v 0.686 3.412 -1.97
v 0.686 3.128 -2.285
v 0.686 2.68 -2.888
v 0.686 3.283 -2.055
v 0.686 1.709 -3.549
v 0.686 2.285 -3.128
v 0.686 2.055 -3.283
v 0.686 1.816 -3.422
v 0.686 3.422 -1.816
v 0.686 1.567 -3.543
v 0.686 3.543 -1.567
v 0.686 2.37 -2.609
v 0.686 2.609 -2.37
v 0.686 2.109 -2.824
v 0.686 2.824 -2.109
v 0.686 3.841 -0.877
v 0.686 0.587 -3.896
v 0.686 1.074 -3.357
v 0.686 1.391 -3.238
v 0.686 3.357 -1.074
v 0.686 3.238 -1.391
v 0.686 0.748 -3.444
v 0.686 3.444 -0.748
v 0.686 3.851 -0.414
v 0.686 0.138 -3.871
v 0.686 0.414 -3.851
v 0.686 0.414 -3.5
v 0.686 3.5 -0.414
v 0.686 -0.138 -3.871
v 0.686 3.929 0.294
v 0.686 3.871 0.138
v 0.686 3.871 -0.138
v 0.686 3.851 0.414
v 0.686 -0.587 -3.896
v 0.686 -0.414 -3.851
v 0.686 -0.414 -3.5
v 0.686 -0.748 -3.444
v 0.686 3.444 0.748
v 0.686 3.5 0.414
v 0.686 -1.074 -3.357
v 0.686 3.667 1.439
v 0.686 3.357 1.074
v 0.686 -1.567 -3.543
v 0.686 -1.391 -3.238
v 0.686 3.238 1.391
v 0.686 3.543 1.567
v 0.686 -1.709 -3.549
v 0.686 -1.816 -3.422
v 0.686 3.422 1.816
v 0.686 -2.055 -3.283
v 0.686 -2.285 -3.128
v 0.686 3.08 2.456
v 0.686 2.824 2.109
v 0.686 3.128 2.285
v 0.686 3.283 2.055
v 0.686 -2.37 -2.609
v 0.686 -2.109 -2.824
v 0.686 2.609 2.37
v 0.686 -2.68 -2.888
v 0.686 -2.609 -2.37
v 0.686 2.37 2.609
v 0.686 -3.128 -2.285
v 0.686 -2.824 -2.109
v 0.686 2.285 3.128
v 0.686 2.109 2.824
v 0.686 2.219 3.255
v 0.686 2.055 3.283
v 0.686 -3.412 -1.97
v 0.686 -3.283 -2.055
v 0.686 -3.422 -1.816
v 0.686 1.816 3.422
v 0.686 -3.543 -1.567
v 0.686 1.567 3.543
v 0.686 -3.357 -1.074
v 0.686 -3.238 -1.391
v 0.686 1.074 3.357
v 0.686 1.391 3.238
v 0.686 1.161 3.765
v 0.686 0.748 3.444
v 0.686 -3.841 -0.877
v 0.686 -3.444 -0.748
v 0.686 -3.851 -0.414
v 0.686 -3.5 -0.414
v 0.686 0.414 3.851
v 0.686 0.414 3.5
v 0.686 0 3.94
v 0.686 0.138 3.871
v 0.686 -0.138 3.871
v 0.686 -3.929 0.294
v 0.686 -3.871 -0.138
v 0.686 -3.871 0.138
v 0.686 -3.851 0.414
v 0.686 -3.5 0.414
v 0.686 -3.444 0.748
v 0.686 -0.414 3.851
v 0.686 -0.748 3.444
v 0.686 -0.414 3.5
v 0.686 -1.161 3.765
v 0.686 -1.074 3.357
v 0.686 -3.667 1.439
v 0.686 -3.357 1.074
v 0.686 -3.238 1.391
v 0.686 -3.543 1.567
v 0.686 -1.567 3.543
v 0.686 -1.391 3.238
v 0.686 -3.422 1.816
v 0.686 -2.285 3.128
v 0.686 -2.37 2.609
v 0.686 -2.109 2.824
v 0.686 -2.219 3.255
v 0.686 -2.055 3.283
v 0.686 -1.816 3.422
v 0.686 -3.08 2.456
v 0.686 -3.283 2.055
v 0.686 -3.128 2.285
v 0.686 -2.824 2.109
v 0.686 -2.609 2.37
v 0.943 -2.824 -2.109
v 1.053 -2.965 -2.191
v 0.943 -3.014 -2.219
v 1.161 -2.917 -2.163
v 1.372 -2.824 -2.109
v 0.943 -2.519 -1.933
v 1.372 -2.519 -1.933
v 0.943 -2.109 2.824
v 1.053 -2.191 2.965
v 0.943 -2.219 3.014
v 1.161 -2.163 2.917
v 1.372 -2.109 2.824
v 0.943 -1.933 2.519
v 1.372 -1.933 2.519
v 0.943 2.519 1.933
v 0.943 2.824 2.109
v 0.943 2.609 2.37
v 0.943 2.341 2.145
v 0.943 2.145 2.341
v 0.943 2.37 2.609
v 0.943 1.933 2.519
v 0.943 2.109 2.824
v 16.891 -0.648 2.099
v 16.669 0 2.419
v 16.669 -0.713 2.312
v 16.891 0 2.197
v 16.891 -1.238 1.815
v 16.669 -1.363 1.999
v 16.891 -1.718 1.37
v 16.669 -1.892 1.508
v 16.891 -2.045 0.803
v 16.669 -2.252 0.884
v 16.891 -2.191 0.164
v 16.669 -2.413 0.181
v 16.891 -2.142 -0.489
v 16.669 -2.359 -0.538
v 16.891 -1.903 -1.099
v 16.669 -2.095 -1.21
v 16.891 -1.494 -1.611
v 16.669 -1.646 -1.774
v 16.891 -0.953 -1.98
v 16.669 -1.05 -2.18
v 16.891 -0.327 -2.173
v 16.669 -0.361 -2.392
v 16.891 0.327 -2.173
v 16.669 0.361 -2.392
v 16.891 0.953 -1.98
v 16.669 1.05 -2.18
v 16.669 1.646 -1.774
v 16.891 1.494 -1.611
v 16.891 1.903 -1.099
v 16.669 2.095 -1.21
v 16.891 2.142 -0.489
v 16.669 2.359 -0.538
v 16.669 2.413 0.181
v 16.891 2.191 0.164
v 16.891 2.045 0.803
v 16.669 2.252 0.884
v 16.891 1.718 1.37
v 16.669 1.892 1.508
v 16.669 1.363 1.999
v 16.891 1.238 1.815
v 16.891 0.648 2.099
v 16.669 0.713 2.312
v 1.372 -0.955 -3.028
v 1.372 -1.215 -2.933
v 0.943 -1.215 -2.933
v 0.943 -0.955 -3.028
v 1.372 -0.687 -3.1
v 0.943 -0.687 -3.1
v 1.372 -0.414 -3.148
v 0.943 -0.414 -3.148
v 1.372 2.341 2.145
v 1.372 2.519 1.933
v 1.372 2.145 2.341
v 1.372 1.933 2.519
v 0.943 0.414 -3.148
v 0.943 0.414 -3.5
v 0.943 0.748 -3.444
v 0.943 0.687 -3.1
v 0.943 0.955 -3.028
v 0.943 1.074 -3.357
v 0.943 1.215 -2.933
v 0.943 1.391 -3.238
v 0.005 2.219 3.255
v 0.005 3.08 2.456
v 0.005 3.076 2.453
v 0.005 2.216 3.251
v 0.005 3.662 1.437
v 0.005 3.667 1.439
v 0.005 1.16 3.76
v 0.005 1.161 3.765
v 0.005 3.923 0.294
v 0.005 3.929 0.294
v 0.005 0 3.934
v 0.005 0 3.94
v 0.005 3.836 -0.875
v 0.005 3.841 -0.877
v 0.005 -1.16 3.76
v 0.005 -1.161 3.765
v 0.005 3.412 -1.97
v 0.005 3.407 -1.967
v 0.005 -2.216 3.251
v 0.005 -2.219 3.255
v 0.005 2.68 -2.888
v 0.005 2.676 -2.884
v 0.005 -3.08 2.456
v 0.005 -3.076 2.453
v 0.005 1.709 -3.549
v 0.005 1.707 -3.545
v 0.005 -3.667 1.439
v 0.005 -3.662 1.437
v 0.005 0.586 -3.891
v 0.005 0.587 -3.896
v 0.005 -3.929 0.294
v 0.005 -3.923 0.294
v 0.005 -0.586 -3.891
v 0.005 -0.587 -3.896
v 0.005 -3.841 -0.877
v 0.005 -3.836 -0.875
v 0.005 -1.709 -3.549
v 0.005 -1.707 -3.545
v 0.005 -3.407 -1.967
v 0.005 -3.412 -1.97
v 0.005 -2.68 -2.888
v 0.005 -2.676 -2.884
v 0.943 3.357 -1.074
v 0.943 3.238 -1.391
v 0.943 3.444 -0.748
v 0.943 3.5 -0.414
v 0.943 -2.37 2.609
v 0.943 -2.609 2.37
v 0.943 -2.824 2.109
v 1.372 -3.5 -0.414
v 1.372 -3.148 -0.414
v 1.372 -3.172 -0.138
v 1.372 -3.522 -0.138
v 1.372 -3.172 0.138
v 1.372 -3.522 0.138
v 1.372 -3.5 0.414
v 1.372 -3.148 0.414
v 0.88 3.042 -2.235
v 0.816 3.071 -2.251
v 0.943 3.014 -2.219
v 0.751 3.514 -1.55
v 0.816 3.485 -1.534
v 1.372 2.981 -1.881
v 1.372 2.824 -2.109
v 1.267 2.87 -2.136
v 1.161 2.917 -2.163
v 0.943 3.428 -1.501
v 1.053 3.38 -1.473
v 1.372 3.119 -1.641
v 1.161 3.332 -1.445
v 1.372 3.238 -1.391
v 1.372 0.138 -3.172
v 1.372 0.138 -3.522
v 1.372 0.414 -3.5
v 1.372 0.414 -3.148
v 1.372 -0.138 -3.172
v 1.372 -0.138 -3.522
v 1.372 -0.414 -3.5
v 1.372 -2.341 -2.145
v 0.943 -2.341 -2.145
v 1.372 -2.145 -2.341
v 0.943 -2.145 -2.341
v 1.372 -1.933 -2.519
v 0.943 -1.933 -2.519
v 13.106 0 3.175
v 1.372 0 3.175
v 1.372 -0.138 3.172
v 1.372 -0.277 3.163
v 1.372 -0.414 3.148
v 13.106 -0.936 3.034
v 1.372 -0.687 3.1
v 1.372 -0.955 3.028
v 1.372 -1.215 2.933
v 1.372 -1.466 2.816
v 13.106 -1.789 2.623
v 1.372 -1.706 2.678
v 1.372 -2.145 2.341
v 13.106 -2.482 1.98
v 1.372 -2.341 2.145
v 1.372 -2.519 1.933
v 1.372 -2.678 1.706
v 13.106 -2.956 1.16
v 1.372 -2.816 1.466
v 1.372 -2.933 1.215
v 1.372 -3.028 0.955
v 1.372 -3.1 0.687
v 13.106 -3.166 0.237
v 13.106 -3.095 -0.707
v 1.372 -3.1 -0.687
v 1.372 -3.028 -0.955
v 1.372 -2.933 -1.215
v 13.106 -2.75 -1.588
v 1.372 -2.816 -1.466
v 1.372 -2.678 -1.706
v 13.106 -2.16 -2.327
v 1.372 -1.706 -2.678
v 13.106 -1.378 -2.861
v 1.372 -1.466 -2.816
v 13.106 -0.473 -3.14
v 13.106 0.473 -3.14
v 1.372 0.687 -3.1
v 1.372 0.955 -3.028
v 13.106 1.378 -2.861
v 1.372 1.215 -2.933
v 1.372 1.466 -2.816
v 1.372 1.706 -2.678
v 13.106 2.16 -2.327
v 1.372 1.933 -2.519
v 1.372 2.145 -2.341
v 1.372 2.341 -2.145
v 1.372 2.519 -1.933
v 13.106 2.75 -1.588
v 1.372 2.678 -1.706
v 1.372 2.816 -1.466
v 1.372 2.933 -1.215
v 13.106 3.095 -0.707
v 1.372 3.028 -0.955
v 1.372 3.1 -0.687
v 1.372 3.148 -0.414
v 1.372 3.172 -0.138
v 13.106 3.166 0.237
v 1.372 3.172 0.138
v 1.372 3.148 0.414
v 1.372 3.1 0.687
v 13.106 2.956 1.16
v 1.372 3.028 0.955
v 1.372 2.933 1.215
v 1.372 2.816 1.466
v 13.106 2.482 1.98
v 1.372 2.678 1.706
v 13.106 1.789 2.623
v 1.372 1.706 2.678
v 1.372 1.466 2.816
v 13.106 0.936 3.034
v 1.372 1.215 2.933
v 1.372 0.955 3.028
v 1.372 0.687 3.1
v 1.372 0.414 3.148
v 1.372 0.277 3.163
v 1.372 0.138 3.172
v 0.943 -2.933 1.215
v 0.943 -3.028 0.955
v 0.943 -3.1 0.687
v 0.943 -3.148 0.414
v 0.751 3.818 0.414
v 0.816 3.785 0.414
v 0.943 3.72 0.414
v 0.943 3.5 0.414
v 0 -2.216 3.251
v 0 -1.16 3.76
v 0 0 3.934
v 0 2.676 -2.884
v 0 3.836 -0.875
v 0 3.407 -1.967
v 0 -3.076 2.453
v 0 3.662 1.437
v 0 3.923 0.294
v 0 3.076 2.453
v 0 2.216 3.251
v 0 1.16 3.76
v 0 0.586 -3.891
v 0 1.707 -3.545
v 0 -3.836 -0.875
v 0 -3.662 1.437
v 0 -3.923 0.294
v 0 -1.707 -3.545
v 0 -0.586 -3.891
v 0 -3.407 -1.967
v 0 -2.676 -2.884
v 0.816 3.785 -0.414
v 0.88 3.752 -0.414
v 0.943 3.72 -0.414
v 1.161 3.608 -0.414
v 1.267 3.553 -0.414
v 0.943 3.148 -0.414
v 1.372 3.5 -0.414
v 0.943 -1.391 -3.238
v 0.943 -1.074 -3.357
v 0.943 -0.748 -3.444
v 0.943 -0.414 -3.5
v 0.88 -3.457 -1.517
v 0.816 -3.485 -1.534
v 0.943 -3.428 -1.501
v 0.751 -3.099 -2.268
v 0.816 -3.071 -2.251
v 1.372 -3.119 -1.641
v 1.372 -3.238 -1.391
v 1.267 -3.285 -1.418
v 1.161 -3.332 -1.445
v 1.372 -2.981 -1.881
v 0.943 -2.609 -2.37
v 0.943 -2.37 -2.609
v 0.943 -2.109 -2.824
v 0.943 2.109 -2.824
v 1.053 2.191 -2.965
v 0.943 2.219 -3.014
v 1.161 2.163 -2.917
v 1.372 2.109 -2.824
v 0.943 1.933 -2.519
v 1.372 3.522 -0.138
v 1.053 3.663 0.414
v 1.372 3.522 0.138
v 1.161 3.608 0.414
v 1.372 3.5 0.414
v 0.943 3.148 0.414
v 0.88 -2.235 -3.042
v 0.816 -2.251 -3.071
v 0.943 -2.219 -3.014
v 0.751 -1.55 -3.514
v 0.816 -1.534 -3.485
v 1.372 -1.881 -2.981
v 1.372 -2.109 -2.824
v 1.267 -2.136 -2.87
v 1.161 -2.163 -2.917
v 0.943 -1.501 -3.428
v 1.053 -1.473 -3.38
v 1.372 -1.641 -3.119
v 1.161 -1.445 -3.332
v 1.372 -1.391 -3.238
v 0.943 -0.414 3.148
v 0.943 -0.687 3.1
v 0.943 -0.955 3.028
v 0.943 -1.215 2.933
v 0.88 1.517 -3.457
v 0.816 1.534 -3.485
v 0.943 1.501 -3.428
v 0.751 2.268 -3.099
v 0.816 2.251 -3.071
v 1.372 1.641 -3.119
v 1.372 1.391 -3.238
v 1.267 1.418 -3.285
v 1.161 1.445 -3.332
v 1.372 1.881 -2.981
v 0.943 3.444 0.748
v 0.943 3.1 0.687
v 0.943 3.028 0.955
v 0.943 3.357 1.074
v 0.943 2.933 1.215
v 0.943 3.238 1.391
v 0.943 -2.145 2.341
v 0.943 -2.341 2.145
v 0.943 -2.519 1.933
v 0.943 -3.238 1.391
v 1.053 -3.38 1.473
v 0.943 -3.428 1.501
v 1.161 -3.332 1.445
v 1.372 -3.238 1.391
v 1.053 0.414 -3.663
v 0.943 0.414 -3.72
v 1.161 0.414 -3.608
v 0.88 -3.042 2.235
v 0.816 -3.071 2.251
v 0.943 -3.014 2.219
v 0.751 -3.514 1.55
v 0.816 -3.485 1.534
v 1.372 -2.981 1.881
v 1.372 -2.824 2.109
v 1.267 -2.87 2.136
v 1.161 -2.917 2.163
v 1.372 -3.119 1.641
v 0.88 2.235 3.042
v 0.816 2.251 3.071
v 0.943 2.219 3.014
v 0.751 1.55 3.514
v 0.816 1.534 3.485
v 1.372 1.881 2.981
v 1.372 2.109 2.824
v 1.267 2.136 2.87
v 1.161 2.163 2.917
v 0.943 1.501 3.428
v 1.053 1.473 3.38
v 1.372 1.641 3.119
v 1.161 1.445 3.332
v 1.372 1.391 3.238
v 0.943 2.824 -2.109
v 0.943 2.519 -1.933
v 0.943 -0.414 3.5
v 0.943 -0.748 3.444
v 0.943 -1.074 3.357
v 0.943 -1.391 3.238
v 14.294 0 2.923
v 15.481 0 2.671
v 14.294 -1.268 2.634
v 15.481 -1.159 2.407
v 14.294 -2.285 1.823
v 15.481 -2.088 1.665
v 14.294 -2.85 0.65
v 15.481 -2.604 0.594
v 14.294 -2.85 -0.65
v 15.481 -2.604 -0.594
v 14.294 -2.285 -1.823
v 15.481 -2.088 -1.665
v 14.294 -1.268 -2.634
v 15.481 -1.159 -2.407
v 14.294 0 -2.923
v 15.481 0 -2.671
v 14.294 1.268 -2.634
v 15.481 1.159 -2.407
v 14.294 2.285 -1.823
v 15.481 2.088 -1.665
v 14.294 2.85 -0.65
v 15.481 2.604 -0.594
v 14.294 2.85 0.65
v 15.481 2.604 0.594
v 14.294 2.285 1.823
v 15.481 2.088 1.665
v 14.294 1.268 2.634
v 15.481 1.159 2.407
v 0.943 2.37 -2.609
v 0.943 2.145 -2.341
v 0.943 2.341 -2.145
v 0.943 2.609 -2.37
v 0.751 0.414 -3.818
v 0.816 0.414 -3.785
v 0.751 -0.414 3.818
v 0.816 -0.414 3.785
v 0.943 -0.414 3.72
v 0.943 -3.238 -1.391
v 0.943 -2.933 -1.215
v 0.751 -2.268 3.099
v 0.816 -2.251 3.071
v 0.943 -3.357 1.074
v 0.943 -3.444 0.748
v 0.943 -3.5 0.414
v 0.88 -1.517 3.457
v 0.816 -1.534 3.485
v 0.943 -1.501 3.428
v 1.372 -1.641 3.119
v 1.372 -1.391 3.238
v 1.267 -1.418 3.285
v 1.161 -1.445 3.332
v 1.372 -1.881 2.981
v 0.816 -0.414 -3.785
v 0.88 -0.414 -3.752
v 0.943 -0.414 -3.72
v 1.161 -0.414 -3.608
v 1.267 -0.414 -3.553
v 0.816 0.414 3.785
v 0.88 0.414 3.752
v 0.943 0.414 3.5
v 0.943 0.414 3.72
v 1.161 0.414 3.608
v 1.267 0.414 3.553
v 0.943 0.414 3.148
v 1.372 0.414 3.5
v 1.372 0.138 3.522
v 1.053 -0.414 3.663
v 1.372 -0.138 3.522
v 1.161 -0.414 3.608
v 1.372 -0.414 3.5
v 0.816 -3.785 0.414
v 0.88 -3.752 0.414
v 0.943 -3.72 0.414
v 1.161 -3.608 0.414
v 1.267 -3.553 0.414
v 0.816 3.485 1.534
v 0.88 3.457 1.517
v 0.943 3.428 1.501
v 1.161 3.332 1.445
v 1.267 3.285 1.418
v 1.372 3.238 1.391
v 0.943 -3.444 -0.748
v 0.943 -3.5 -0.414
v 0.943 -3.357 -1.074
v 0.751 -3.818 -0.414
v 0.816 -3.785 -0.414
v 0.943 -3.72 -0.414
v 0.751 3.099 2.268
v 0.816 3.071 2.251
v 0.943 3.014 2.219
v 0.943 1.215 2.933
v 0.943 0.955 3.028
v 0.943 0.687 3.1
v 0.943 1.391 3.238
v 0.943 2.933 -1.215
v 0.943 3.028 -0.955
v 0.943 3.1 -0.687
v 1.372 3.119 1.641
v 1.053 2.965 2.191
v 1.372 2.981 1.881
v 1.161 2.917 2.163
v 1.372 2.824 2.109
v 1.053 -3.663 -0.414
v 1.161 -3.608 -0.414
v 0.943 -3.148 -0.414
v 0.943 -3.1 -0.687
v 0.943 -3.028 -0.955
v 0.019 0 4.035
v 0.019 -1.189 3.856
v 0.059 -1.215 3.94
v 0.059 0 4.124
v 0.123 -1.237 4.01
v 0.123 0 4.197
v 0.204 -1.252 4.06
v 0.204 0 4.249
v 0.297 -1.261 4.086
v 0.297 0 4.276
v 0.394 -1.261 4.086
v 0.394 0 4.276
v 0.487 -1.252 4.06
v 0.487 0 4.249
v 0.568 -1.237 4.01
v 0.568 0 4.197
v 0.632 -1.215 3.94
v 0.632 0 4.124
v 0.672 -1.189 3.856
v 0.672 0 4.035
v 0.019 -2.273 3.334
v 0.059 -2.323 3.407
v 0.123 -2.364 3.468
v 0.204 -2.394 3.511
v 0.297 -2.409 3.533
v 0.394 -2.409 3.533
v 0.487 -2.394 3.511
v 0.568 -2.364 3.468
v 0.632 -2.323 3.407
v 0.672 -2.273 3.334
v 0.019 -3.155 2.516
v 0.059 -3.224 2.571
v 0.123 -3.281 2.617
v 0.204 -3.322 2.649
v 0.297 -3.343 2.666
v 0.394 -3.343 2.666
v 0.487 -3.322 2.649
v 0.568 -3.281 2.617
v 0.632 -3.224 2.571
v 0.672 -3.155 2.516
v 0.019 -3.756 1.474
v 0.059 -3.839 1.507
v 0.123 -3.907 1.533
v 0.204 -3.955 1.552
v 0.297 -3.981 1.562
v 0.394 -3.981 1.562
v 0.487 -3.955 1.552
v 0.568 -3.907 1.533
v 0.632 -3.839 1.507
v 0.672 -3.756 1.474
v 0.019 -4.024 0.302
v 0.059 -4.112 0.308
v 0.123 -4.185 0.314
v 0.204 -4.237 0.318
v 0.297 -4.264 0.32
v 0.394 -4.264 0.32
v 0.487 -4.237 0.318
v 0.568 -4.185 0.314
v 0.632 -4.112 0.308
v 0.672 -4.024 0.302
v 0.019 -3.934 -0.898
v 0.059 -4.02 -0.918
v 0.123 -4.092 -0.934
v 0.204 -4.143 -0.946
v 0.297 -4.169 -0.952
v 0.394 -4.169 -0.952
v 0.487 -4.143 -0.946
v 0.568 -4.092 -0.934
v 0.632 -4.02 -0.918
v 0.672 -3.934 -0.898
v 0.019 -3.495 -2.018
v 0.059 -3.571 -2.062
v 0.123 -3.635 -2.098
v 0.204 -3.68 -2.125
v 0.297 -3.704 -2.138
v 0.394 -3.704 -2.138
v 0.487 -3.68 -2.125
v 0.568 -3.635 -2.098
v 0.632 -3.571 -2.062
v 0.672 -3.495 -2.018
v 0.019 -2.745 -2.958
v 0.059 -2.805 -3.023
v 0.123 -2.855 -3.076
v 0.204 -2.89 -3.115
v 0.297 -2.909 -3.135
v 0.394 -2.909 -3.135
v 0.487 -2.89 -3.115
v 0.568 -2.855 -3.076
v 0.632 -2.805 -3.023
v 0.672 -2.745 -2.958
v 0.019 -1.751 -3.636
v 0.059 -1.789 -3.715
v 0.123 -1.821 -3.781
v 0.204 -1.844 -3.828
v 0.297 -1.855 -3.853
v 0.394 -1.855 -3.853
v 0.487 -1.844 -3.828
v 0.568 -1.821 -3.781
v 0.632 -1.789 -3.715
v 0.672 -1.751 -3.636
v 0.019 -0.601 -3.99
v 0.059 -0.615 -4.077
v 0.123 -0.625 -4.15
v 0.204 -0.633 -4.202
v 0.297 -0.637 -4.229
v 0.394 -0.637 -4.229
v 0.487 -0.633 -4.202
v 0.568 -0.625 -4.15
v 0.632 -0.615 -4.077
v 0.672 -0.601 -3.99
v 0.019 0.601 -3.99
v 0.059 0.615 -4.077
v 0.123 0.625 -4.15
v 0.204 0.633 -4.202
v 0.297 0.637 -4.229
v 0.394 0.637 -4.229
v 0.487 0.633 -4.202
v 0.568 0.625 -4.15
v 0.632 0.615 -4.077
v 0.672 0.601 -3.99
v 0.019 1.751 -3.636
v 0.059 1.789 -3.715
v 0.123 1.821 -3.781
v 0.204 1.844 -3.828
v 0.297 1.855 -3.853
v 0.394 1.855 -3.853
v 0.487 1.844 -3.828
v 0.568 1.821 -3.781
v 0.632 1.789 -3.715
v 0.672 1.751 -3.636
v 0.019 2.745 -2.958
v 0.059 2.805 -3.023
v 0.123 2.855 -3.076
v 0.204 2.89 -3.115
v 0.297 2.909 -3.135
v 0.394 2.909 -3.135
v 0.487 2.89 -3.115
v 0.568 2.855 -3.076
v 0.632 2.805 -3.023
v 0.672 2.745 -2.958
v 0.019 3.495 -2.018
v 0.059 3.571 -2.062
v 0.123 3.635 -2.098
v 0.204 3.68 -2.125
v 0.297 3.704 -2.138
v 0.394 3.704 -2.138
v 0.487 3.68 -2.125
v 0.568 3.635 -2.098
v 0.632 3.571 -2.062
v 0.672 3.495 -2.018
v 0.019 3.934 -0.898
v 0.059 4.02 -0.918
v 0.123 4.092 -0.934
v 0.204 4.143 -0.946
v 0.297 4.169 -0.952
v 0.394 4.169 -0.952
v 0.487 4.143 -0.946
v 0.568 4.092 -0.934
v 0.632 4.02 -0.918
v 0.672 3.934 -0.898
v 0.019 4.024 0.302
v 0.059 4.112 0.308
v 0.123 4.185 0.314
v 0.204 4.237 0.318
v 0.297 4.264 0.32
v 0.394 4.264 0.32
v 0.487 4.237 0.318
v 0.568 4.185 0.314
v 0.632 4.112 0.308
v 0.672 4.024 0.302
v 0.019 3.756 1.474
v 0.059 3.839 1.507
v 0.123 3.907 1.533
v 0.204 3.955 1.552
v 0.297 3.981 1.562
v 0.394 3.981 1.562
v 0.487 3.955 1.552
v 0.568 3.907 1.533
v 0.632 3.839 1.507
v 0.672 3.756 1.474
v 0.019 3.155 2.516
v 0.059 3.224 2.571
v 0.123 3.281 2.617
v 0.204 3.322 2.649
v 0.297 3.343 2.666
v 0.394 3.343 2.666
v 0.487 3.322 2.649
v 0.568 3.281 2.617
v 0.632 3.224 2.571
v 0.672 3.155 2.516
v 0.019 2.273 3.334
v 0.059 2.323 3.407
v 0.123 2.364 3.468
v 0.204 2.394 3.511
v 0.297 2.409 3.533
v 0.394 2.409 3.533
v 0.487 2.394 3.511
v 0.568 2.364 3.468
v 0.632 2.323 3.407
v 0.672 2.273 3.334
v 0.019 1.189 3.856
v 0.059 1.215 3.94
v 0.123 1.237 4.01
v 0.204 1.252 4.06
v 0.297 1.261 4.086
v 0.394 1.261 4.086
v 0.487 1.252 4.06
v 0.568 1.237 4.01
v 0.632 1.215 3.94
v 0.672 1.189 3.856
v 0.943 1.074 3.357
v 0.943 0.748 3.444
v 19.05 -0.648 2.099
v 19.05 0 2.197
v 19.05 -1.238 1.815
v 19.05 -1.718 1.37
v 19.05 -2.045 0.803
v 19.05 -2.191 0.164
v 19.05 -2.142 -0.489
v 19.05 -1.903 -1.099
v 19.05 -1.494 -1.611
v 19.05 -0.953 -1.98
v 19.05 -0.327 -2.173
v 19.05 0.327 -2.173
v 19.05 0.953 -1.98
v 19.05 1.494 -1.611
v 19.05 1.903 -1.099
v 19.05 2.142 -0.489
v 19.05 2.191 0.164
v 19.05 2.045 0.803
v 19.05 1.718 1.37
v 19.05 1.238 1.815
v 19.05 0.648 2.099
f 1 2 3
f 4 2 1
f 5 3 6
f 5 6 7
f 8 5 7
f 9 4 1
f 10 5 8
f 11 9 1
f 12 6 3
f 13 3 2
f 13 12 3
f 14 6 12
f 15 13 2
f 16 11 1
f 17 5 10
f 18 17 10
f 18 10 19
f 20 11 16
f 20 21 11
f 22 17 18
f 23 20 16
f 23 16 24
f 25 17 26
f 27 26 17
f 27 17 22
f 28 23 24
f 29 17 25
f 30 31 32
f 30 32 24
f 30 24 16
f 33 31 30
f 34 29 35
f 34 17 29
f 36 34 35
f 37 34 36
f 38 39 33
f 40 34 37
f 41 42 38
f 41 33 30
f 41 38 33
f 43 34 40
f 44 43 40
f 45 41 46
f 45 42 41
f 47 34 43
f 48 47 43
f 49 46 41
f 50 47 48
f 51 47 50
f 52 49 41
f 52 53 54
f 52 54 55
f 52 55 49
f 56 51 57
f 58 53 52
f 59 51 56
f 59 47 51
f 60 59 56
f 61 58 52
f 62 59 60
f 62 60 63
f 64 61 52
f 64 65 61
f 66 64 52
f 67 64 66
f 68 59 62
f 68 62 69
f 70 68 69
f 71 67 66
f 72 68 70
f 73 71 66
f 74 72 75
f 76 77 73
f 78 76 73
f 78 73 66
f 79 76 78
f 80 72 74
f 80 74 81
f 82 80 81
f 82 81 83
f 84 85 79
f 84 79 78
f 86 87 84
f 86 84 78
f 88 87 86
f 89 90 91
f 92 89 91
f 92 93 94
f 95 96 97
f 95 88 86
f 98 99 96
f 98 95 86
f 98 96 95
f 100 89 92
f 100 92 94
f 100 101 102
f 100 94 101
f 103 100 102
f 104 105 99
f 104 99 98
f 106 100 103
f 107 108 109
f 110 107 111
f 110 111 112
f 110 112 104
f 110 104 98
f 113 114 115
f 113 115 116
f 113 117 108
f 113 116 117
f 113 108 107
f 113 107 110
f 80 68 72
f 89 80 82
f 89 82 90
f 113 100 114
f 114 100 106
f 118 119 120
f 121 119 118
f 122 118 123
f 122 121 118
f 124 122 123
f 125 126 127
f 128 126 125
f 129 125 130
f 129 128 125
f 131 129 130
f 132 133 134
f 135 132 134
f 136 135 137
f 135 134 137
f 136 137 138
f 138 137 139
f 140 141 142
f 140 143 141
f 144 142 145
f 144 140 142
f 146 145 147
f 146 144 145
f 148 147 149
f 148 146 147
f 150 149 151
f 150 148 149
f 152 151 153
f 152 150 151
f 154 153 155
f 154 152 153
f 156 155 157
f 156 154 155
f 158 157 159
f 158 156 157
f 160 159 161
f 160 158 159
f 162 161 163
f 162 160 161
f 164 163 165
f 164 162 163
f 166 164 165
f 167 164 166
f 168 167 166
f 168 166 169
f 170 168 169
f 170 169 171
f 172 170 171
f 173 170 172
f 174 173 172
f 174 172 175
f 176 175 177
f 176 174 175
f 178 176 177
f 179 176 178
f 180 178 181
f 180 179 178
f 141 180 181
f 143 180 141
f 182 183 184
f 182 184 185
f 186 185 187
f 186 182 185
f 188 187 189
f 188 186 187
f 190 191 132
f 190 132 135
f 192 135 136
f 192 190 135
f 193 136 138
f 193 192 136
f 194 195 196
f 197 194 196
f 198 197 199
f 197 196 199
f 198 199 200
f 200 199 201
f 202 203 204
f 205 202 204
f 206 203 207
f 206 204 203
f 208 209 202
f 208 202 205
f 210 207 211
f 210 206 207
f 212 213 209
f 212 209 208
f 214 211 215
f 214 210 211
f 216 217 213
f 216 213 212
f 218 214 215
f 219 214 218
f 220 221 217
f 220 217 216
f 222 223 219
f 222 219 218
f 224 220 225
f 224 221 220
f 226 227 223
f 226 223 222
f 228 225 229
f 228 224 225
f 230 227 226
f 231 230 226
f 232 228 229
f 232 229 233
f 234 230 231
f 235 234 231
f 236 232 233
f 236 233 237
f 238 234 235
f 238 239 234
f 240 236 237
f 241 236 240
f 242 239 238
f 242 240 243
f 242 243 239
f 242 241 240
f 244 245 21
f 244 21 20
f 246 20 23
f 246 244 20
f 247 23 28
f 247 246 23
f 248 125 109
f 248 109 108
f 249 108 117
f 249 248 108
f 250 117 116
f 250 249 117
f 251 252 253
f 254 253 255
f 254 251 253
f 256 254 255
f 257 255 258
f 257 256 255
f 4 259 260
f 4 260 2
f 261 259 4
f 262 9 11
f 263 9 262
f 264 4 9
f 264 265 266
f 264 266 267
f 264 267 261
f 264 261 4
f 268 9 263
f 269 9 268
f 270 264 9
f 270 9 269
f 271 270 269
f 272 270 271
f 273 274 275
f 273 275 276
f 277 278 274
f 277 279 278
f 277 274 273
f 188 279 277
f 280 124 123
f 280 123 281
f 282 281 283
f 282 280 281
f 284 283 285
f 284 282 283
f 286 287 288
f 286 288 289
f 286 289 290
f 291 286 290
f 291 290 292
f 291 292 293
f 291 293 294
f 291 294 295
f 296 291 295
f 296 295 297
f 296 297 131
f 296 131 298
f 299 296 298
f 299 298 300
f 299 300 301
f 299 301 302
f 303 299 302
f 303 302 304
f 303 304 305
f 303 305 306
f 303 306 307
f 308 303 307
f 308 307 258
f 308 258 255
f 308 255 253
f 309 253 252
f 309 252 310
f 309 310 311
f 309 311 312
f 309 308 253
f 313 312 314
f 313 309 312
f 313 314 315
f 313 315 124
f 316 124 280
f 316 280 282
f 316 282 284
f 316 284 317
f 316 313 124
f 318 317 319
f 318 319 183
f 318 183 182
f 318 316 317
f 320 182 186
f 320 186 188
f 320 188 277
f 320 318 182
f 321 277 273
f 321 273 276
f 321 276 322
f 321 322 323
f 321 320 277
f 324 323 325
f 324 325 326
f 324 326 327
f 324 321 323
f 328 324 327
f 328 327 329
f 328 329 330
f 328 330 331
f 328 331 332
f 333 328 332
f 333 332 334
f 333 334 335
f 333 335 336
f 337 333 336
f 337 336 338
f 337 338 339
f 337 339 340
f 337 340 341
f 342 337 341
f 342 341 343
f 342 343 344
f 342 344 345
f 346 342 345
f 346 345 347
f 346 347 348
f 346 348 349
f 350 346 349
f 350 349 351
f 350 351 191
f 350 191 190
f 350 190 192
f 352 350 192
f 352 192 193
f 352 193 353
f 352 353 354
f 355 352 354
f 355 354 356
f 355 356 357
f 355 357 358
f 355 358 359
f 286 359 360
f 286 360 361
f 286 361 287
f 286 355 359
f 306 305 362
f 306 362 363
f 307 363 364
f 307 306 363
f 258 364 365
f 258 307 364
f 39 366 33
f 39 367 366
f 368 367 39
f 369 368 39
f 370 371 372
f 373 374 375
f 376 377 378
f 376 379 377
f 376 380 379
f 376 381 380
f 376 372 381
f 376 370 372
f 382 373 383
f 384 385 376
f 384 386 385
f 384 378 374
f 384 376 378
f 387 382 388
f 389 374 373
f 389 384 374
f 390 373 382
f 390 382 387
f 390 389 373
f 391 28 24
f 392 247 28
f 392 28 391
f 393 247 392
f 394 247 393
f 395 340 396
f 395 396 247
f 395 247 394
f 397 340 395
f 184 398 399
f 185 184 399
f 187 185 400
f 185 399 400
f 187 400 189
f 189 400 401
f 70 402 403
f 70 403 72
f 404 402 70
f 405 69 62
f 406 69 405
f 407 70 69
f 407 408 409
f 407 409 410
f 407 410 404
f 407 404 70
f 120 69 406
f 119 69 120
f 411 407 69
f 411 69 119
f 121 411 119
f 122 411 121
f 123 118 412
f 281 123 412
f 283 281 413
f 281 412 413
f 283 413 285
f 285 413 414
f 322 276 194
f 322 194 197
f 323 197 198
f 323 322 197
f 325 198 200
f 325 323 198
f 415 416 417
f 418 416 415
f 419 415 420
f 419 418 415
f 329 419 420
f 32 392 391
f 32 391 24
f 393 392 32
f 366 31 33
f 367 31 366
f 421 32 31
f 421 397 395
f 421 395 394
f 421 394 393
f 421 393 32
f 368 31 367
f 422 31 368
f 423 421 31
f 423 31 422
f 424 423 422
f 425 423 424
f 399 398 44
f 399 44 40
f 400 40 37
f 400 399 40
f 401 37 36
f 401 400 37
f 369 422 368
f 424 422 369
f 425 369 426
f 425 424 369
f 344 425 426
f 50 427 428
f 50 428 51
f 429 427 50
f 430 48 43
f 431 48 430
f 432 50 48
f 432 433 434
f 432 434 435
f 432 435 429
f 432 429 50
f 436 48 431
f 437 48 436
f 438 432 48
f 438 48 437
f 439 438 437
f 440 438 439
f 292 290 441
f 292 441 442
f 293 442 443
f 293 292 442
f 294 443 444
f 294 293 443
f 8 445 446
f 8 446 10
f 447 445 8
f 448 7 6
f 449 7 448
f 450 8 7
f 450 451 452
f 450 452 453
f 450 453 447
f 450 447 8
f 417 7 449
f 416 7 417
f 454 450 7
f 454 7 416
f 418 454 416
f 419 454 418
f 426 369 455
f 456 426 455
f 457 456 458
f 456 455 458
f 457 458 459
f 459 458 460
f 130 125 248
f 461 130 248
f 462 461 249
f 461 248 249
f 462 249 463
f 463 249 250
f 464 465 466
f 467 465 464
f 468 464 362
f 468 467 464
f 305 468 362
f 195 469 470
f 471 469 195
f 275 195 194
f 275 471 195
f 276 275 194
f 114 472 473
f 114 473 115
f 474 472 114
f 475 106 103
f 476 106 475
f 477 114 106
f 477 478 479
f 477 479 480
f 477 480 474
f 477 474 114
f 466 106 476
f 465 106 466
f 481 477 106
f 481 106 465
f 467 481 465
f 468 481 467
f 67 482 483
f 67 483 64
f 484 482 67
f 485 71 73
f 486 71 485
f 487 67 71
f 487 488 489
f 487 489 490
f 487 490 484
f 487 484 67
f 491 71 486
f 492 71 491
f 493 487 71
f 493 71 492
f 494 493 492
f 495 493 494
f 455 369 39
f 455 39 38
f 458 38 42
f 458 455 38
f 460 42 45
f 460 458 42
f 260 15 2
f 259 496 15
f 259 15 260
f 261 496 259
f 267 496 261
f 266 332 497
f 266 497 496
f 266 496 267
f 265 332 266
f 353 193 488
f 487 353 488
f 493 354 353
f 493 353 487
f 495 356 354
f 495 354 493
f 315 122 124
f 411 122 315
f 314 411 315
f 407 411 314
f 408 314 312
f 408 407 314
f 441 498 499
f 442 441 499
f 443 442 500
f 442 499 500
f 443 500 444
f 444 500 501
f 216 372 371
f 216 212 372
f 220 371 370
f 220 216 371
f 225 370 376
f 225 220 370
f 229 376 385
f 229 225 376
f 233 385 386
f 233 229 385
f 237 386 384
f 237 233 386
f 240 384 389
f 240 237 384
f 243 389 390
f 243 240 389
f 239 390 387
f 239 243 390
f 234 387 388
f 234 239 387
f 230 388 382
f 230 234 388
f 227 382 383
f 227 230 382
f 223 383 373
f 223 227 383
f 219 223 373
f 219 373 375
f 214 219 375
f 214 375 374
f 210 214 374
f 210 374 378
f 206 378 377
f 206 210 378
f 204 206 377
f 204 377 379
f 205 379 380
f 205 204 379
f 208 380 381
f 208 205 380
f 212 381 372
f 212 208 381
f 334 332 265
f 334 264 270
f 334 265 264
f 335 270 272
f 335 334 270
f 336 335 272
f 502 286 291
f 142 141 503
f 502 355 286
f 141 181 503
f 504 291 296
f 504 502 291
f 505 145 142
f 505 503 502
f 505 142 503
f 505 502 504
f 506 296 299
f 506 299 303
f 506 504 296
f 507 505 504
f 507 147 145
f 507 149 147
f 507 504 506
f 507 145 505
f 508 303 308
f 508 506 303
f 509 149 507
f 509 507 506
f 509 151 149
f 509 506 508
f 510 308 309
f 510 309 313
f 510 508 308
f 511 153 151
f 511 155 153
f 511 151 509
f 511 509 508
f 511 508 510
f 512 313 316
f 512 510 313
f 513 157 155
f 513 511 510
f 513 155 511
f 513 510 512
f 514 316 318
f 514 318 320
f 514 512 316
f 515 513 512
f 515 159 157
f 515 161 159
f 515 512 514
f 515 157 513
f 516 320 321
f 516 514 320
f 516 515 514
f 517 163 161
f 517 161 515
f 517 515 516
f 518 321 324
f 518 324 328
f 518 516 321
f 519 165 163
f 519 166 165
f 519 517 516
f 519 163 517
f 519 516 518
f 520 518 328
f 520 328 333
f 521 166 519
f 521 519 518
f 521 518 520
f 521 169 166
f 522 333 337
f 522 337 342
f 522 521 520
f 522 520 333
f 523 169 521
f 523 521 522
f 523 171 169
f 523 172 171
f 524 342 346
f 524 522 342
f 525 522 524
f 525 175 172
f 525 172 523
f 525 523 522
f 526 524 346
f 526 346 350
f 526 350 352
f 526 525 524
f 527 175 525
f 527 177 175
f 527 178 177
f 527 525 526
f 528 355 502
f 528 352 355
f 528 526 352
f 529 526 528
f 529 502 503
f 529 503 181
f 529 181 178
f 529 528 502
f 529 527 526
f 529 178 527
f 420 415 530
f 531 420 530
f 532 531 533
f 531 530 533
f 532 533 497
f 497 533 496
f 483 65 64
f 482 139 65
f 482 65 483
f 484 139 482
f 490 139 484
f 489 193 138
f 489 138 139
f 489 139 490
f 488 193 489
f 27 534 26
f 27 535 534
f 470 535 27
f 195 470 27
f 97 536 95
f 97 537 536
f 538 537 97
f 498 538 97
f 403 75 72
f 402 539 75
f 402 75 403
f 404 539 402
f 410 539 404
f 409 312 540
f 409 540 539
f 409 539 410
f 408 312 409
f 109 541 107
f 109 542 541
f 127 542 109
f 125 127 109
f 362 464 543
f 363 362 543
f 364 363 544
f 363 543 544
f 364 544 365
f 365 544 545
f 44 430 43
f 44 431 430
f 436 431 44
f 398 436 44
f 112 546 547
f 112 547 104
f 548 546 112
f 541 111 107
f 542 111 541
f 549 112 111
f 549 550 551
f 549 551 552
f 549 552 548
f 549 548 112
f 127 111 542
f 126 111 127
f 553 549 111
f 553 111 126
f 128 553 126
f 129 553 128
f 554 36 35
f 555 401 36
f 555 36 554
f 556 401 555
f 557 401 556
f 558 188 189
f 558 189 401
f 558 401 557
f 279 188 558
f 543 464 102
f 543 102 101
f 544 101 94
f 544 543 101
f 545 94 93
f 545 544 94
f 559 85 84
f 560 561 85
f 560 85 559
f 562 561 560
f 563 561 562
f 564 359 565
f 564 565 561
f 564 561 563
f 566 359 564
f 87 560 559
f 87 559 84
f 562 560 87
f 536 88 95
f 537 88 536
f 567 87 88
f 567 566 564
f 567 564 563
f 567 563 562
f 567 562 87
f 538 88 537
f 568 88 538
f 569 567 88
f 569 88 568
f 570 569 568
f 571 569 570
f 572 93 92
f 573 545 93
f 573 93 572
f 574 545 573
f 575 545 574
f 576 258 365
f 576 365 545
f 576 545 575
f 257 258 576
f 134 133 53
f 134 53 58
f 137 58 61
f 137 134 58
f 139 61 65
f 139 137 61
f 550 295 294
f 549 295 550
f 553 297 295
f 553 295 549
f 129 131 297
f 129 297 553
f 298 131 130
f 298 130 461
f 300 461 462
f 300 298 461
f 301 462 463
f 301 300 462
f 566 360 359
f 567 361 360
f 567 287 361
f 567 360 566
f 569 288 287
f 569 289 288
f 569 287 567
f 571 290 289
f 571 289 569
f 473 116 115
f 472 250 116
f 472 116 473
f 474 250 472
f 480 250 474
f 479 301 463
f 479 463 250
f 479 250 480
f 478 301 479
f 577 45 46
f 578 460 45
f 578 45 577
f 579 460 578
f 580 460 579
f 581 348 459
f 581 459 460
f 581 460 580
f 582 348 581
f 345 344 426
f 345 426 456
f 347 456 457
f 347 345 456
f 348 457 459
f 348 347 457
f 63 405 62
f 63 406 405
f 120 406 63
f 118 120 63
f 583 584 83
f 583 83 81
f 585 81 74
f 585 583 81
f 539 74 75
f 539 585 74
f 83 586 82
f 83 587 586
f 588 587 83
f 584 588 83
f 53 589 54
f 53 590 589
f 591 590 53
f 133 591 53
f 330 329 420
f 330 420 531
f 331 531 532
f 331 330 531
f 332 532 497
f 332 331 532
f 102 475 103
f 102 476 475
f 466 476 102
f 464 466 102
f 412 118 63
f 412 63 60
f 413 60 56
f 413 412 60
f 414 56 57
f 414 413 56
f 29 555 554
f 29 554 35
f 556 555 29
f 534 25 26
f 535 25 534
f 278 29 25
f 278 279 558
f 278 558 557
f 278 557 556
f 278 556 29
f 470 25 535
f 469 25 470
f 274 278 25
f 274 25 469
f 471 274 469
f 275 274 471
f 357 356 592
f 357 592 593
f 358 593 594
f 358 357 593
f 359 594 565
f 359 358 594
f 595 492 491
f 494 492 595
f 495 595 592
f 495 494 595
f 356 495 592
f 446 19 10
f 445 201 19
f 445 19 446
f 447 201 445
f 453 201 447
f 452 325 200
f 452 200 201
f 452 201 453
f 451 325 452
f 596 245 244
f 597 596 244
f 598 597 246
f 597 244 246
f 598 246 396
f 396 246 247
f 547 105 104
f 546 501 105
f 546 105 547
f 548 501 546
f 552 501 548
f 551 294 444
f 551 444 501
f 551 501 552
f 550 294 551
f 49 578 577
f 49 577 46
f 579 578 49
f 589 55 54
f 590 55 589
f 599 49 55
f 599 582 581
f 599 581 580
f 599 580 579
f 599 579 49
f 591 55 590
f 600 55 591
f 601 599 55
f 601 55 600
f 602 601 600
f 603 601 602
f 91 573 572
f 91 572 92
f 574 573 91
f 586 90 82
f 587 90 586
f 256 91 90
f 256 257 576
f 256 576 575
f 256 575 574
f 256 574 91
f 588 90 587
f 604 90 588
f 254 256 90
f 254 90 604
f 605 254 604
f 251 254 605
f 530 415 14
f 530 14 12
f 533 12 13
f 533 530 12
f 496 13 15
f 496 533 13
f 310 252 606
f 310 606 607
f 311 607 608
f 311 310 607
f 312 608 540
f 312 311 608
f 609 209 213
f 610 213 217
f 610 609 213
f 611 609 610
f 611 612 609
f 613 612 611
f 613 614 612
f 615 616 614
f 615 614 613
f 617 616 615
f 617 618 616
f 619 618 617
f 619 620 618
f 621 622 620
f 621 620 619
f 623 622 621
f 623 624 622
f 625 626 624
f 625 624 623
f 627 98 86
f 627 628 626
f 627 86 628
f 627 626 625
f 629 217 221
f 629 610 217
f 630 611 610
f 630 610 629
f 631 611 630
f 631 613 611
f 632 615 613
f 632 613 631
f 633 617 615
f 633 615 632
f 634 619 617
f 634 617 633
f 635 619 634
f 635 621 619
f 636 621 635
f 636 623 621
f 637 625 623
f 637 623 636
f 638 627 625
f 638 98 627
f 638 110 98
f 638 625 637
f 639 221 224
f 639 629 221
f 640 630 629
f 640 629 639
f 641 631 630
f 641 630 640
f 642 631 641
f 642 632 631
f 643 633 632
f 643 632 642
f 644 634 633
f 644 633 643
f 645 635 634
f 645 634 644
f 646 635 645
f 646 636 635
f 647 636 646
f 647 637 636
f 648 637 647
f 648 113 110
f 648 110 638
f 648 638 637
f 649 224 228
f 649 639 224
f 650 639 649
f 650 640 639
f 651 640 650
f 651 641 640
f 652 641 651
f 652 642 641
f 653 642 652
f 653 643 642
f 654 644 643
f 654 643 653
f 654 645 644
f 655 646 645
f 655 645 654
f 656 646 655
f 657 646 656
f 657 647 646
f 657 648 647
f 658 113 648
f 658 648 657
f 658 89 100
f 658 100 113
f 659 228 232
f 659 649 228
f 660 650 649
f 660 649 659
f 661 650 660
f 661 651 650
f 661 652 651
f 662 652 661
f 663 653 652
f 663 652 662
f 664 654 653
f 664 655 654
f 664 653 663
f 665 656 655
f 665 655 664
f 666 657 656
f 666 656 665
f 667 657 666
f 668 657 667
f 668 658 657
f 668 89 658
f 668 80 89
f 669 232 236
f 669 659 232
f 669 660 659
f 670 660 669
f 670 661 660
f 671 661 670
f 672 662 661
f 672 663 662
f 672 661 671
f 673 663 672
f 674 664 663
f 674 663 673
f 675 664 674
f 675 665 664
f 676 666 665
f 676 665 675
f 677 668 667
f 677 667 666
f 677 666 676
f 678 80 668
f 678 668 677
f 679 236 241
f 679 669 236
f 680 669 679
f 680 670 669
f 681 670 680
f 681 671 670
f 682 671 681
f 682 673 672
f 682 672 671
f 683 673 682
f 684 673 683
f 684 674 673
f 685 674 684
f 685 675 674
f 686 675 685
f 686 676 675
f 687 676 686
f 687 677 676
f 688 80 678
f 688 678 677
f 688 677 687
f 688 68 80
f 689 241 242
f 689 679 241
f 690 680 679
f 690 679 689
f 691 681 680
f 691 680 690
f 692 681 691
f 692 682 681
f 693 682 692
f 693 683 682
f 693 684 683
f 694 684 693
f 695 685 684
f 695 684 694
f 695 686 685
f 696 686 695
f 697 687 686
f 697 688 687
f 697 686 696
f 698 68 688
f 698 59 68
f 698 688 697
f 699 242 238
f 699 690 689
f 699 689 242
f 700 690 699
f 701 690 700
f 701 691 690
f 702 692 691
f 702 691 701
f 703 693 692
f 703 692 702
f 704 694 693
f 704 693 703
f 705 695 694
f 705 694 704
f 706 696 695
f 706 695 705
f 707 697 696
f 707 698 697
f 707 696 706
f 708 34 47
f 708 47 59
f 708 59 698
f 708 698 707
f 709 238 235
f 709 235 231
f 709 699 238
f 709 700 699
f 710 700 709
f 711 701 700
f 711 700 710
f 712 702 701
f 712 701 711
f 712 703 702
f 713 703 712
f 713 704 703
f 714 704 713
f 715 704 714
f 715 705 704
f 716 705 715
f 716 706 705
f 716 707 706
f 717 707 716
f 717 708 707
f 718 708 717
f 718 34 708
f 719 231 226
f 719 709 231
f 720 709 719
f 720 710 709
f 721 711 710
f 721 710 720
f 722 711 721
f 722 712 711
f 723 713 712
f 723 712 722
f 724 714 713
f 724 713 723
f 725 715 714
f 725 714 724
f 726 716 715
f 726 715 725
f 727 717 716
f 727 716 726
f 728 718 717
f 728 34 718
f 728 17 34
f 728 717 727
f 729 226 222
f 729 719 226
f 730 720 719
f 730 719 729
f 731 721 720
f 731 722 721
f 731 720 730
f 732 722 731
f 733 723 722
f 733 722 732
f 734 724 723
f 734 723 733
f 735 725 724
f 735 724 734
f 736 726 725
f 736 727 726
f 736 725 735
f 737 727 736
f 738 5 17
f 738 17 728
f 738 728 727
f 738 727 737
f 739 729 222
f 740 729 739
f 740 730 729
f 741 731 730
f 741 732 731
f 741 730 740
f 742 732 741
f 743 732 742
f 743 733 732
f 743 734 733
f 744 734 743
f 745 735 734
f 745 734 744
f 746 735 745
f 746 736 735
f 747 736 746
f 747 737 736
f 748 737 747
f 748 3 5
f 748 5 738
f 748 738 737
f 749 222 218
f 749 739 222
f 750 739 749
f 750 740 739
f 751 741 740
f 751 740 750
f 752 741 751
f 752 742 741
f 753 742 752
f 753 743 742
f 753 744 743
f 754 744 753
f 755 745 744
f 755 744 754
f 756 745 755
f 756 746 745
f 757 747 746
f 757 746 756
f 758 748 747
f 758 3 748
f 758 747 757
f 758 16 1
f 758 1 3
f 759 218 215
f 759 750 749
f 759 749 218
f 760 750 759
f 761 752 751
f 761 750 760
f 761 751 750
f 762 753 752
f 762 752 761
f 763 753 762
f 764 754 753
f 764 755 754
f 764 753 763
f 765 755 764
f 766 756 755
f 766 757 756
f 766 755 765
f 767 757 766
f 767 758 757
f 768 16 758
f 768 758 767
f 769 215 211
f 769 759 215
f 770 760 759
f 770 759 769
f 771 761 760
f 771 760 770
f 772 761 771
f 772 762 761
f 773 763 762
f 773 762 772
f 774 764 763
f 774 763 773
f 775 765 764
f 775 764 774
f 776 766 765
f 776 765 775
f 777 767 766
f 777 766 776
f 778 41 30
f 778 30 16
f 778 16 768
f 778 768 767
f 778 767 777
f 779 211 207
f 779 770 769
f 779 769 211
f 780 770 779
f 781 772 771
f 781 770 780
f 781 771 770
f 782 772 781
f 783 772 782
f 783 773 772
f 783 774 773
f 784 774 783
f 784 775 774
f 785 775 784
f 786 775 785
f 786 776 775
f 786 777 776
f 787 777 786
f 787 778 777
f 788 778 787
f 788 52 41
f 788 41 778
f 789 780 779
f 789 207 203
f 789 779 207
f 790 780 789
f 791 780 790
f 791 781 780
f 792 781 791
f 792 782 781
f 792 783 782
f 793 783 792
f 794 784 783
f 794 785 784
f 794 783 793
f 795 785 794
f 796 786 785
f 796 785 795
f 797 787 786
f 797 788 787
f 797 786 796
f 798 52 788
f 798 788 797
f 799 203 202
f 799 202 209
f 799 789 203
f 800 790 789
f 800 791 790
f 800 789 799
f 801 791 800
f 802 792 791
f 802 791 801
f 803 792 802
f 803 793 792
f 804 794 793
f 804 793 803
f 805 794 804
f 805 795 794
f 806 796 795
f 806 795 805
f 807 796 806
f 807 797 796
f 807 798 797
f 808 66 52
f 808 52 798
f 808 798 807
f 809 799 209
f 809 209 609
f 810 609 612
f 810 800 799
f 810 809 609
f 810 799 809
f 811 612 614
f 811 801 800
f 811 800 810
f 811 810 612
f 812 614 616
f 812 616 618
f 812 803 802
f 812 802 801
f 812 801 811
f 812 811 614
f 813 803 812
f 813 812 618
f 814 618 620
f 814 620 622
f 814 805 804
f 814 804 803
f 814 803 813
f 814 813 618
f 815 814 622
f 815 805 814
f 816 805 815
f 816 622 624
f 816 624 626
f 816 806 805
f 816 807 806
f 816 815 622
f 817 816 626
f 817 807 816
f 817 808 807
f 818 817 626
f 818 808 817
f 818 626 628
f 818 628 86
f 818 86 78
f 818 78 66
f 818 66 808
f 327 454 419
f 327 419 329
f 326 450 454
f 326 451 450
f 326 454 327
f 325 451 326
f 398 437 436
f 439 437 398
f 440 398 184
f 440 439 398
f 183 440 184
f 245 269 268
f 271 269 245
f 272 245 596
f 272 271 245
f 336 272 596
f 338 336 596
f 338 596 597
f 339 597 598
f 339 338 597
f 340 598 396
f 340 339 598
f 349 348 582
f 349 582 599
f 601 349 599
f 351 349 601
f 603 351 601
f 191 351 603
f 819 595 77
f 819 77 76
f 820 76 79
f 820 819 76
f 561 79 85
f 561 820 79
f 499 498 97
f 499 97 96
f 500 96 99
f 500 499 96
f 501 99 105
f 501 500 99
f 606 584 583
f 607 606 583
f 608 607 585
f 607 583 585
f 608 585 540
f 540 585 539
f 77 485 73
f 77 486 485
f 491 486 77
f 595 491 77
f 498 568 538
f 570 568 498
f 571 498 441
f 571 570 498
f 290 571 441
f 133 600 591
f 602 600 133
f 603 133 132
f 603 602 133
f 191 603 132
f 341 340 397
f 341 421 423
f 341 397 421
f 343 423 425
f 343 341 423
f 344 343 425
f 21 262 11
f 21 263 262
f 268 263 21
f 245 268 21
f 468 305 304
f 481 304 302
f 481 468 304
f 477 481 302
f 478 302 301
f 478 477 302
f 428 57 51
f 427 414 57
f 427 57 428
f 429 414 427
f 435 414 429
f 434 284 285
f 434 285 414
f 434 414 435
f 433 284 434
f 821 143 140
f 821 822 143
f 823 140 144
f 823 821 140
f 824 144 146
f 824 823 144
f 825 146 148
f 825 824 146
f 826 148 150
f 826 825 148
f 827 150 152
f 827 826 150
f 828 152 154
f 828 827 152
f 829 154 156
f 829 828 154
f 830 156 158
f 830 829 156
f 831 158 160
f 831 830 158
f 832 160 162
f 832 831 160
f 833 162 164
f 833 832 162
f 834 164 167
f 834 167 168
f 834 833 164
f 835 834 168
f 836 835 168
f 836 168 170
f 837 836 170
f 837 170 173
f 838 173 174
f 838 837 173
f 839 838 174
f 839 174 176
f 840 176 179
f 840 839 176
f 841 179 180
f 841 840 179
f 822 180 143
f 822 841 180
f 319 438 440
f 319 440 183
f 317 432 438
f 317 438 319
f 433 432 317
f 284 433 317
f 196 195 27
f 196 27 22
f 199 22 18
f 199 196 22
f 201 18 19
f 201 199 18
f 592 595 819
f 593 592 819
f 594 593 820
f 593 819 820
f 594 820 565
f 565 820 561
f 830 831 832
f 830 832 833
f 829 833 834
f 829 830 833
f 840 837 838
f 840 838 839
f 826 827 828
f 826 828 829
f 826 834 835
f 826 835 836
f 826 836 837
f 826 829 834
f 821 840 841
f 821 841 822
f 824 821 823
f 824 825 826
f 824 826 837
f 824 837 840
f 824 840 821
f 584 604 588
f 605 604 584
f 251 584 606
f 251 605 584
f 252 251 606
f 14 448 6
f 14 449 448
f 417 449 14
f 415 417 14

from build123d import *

# Parameters (mm, degrees)
RIBCUT1_DEPTH    = 0.428625
RIBCUT2_DEPTH    = 0.6858
RIBCUTSPAT_COUNT = 12
RIBCUTSPAT_ANGLE = 330


with BuildPart() as part:
    # BodySke → BaseBody (revolve)
    with BuildSketch(Plane.XY, mode=Mode.PRIVATE) as basebody_sk:
        with BuildLine():
            Line((0, 0), (0, 3.93446))
            Line((0, 3.93446), (0.00508, 3.93446))
            Line((0.00508, 3.93446), (0.00508, 3.93954))
            ThreePointArc((0.00508, 3.93954), (0.34544, 4.2799), (0.6858, 3.93954))
            Line((0.6858, 3.93954), (0.6858, 3.8735))
            Line((0.6858, 3.8735), (1.3716, 3.52425))
            Line((1.3716, 3.52425), (1.3716, 3.175))
            Line((1.3716, 3.175), (13.1064, 3.175))
            Line((13.1064, 3.175), (16.66875, 2.41935))
            Line((16.66875, 2.41935), (16.891, 2.1971))
            Line((16.891, 2.1971), (19.05, 2.1971))
            Line((19.05, 2.1971), (19.05, 0))
            Line((19.05, 0), (0, 0))
        make_face()
    revolve(basebody_sk.sketch.rotate(Axis((0, 0, 0), (1, 0, 0)), 90), axis=Axis((0, 0, 0), (1, 0, 0)))

    # RibCut1Ske → RibCut1 (cut)
    with BuildSketch(Plane(origin=(1.3716, 0, 0), x_dir=(0, 0, -1), z_dir=(1, 0, 0))):
        with BuildLine():
            Line((0.41442066, 3.147837435), (0.41442066, 4.259788672))
            ThreePointArc((0.41442066, 4.259788672), (1.107719631, 4.134065944), (1.770995516, 3.896295534))
            Line((1.770995516, 3.896295534), (1.215019898, 2.933317516))
            ThreePointArc((1.215019898, 2.933317516), (0.821750468, 3.066814498), (0.41442066, 3.147837435))
        make_face()
    ribcut1 = extrude(amount=-RIBCUT1_DEPTH, mode=Mode.SUBTRACT)

    # RibCut2Ske → RibCut2 (cut)
    with BuildSketch(Plane(origin=(1.3716, 0, 0), x_dir=(0, 0, -1), z_dir=(1, 0, 0))):
        with BuildLine():
            Line((0.41442066, 3.499799077), (0.41442066, 4.259788672))
            ThreePointArc((0.41442066, 4.259788672), (1.107719631, 4.134065944), (1.770995516, 3.896295534))
            Line((1.770995516, 3.896295534), (1.391000719, 3.238125239))
            ThreePointArc((1.391000719, 3.238125239), (0.91214302, 3.404164093), (0.41442066, 3.499799077))
        make_face()
    ribcut2 = extrude(amount=-RIBCUT2_DEPTH, mode=Mode.SUBTRACT)

    # RibCutsPat: RibCut1, RibCut2 ×12 about axis
    ribcutspat_axis = Axis((0, 0, 0), (1, 0, 0))
    add([ribcut1.rotate(ribcutspat_axis, i * RIBCUTSPAT_ANGLE / (RIBCUTSPAT_COUNT - 1)) for i in range(1, RIBCUTSPAT_COUNT)], mode=Mode.SUBTRACT)
    add([ribcut2.rotate(ribcutspat_axis, i * RIBCUTSPAT_ANGLE / (RIBCUTSPAT_COUNT - 1)) for i in range(1, RIBCUTSPAT_COUNT)], mode=Mode.SUBTRACT)


solid = part.part
